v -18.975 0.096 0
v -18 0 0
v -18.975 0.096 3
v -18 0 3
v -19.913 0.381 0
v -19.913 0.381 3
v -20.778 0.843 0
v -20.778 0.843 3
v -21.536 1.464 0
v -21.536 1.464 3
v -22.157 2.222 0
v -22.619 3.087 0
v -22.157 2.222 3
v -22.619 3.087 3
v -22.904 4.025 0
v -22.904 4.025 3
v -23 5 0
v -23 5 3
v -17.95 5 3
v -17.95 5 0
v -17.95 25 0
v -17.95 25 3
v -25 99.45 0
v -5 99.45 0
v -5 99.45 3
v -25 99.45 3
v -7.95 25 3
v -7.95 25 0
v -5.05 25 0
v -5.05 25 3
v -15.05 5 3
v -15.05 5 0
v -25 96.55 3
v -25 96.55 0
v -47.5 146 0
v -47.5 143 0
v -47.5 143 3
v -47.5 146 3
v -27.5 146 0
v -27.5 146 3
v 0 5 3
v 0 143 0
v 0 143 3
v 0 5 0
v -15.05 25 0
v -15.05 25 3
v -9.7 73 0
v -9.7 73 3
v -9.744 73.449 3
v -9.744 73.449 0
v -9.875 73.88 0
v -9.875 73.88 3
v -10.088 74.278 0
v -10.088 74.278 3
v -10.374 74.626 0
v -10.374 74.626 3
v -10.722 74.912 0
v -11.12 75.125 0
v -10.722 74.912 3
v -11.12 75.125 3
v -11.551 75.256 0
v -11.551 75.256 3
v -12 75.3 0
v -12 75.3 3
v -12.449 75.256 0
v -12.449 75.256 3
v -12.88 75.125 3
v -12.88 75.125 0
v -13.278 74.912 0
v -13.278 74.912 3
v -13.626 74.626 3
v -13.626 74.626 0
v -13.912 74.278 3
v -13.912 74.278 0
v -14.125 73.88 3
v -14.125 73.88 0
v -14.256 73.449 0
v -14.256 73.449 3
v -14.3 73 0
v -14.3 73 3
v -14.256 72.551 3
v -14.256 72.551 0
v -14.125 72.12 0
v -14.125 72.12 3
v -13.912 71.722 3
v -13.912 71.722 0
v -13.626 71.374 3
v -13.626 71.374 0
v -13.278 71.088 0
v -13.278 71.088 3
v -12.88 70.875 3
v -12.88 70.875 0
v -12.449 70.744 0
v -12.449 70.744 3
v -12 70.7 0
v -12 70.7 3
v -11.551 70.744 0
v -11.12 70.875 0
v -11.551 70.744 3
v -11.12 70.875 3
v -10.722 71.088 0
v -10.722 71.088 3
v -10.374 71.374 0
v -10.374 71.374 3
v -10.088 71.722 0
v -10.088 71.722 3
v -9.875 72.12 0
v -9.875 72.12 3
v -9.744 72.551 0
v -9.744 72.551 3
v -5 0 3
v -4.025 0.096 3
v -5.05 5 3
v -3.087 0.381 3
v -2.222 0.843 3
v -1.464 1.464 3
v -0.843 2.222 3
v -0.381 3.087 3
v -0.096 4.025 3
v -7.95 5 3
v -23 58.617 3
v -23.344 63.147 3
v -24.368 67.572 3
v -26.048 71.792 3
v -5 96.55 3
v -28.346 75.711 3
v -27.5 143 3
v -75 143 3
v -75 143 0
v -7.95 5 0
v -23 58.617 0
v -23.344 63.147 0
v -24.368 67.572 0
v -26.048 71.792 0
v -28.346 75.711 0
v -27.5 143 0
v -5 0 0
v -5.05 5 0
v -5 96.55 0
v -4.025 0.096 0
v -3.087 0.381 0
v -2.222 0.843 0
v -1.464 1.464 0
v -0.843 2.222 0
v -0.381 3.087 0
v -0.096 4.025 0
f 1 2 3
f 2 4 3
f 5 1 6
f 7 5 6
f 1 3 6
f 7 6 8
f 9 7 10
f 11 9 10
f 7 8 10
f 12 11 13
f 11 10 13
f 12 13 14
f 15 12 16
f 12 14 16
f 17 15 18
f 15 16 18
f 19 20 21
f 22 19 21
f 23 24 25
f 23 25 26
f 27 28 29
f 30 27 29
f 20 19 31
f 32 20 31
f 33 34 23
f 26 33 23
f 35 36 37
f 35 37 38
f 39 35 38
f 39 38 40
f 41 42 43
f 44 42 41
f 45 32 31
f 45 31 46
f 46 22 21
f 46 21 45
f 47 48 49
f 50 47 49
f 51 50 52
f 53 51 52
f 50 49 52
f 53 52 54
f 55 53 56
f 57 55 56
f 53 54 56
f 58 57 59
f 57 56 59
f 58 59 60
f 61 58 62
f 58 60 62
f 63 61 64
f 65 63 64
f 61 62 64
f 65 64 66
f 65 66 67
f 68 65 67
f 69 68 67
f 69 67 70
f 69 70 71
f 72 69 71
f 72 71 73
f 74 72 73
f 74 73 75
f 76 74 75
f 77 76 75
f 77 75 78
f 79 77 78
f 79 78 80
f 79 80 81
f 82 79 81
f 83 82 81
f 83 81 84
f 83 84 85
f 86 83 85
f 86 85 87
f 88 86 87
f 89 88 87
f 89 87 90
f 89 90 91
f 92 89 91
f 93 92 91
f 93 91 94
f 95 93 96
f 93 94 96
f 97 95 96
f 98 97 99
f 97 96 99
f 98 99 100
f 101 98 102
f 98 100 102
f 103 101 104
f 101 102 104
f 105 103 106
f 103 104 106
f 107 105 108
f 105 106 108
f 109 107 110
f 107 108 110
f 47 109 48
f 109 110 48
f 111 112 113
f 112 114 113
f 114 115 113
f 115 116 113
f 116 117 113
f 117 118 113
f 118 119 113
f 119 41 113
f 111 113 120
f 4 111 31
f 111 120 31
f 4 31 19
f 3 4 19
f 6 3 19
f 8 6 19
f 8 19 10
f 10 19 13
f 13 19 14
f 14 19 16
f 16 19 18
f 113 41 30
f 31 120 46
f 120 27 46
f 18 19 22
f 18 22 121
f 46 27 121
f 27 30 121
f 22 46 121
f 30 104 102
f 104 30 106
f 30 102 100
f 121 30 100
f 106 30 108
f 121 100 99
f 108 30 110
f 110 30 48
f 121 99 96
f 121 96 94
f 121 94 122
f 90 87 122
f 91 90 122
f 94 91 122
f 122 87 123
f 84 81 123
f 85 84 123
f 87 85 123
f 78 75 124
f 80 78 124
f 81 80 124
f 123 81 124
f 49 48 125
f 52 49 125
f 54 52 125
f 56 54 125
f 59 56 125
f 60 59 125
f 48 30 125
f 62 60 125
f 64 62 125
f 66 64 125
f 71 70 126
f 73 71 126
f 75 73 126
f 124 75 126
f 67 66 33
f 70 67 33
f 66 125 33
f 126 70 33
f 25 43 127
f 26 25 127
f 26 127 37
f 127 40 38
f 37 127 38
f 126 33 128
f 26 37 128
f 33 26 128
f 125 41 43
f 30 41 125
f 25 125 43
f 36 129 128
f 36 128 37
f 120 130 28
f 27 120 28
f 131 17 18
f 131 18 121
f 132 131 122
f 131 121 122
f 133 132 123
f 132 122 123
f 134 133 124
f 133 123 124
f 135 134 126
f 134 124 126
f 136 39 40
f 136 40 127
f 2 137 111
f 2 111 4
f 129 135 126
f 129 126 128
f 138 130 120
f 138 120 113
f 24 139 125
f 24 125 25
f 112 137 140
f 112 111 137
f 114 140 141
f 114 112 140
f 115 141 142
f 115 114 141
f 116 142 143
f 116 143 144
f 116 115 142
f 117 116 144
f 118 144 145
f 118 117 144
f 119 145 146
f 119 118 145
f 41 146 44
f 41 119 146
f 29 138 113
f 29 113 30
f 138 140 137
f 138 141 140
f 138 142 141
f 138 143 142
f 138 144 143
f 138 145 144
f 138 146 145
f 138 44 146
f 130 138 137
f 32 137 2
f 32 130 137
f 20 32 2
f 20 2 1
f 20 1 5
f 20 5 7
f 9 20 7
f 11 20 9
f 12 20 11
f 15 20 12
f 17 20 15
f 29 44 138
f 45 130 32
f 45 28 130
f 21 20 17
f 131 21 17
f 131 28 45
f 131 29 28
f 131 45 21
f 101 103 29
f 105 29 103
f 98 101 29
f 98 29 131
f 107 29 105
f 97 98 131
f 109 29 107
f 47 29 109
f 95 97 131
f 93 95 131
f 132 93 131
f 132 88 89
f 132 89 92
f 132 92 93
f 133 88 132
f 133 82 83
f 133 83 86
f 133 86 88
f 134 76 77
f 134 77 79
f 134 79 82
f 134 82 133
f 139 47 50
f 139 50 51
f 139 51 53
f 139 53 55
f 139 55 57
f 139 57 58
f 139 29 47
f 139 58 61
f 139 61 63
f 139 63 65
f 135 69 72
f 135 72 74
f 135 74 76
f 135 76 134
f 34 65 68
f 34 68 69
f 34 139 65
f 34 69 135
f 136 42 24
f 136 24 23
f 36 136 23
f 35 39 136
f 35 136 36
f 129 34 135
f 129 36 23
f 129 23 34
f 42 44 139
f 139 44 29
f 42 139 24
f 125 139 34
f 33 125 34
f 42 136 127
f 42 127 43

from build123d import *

# Parameters (mm, degrees)
SKETCH1_W           = 2.9
SKETCH1_H           = 20
BOSS_EXTRUDE1_DEPTH = 3
FILLET1_R           = 5
FILLET2_R           = 30
SKETCH4_R           = 2.3
CUT_EXTRUDE1_DEPTH  = 10
SKETCH5_W           = 20
SKETCH5_H           = 2.9
CUT_EXTRUDE2_DEPTH  = 4


with BuildPart() as part:
    # Sketch1 → Boss-Extrude1 (new body)
    with BuildSketch(Plane.XY):
        Polygon((0, 0), (-23, 0), (-23, 68), (-75, 143), (-47.5, 143), (-47.5, 146), (-27.5, 146), (-27.5, 143), (0, 143), align=None)
        with Locations((-16.5, 15)):
            Rectangle(SKETCH1_W, SKETCH1_H, mode=Mode.SUBTRACT)
        with Locations((-6.5, 15)):
            Rectangle(SKETCH1_W, SKETCH1_H, mode=Mode.SUBTRACT)
    extrude(amount=BOSS_EXTRUDE1_DEPTH)

    # Fillet1
    fillet1_edges = [part.edges().sort_by_distance(p)[0] for p in [
        (0, 0, 1.5),
        (-23, 0, 1.5),
    ]]
    fillet(fillet1_edges, radius=FILLET1_R)

    # Fillet2
    fillet2_edges = [part.edges().sort_by_distance(p)[0] for p in [
        (-23, 68, 1.5),
    ]]
    fillet(fillet2_edges, radius=FILLET2_R)

    # Sketch4 → Cut-Extrude1 (cut)
    with BuildSketch(Plane.XY.offset(3)):
        with Locations((-12, 73)):
            Circle(SKETCH4_R)
    extrude(amount=-CUT_EXTRUDE1_DEPTH, mode=Mode.SUBTRACT)

    # Sketch5 → Cut-Extrude2 (cut, through all)
    with BuildSketch(Plane(origin=(0, 0, 0), x_dir=(-1, 0, 0), z_dir=(0, 0, -1))):
        with Locations((15, 98)):
            Rectangle(SKETCH5_W, SKETCH5_H)
    extrude(amount=-CUT_EXTRUDE2_DEPTH, mode=Mode.SUBTRACT)


solid = part.part
